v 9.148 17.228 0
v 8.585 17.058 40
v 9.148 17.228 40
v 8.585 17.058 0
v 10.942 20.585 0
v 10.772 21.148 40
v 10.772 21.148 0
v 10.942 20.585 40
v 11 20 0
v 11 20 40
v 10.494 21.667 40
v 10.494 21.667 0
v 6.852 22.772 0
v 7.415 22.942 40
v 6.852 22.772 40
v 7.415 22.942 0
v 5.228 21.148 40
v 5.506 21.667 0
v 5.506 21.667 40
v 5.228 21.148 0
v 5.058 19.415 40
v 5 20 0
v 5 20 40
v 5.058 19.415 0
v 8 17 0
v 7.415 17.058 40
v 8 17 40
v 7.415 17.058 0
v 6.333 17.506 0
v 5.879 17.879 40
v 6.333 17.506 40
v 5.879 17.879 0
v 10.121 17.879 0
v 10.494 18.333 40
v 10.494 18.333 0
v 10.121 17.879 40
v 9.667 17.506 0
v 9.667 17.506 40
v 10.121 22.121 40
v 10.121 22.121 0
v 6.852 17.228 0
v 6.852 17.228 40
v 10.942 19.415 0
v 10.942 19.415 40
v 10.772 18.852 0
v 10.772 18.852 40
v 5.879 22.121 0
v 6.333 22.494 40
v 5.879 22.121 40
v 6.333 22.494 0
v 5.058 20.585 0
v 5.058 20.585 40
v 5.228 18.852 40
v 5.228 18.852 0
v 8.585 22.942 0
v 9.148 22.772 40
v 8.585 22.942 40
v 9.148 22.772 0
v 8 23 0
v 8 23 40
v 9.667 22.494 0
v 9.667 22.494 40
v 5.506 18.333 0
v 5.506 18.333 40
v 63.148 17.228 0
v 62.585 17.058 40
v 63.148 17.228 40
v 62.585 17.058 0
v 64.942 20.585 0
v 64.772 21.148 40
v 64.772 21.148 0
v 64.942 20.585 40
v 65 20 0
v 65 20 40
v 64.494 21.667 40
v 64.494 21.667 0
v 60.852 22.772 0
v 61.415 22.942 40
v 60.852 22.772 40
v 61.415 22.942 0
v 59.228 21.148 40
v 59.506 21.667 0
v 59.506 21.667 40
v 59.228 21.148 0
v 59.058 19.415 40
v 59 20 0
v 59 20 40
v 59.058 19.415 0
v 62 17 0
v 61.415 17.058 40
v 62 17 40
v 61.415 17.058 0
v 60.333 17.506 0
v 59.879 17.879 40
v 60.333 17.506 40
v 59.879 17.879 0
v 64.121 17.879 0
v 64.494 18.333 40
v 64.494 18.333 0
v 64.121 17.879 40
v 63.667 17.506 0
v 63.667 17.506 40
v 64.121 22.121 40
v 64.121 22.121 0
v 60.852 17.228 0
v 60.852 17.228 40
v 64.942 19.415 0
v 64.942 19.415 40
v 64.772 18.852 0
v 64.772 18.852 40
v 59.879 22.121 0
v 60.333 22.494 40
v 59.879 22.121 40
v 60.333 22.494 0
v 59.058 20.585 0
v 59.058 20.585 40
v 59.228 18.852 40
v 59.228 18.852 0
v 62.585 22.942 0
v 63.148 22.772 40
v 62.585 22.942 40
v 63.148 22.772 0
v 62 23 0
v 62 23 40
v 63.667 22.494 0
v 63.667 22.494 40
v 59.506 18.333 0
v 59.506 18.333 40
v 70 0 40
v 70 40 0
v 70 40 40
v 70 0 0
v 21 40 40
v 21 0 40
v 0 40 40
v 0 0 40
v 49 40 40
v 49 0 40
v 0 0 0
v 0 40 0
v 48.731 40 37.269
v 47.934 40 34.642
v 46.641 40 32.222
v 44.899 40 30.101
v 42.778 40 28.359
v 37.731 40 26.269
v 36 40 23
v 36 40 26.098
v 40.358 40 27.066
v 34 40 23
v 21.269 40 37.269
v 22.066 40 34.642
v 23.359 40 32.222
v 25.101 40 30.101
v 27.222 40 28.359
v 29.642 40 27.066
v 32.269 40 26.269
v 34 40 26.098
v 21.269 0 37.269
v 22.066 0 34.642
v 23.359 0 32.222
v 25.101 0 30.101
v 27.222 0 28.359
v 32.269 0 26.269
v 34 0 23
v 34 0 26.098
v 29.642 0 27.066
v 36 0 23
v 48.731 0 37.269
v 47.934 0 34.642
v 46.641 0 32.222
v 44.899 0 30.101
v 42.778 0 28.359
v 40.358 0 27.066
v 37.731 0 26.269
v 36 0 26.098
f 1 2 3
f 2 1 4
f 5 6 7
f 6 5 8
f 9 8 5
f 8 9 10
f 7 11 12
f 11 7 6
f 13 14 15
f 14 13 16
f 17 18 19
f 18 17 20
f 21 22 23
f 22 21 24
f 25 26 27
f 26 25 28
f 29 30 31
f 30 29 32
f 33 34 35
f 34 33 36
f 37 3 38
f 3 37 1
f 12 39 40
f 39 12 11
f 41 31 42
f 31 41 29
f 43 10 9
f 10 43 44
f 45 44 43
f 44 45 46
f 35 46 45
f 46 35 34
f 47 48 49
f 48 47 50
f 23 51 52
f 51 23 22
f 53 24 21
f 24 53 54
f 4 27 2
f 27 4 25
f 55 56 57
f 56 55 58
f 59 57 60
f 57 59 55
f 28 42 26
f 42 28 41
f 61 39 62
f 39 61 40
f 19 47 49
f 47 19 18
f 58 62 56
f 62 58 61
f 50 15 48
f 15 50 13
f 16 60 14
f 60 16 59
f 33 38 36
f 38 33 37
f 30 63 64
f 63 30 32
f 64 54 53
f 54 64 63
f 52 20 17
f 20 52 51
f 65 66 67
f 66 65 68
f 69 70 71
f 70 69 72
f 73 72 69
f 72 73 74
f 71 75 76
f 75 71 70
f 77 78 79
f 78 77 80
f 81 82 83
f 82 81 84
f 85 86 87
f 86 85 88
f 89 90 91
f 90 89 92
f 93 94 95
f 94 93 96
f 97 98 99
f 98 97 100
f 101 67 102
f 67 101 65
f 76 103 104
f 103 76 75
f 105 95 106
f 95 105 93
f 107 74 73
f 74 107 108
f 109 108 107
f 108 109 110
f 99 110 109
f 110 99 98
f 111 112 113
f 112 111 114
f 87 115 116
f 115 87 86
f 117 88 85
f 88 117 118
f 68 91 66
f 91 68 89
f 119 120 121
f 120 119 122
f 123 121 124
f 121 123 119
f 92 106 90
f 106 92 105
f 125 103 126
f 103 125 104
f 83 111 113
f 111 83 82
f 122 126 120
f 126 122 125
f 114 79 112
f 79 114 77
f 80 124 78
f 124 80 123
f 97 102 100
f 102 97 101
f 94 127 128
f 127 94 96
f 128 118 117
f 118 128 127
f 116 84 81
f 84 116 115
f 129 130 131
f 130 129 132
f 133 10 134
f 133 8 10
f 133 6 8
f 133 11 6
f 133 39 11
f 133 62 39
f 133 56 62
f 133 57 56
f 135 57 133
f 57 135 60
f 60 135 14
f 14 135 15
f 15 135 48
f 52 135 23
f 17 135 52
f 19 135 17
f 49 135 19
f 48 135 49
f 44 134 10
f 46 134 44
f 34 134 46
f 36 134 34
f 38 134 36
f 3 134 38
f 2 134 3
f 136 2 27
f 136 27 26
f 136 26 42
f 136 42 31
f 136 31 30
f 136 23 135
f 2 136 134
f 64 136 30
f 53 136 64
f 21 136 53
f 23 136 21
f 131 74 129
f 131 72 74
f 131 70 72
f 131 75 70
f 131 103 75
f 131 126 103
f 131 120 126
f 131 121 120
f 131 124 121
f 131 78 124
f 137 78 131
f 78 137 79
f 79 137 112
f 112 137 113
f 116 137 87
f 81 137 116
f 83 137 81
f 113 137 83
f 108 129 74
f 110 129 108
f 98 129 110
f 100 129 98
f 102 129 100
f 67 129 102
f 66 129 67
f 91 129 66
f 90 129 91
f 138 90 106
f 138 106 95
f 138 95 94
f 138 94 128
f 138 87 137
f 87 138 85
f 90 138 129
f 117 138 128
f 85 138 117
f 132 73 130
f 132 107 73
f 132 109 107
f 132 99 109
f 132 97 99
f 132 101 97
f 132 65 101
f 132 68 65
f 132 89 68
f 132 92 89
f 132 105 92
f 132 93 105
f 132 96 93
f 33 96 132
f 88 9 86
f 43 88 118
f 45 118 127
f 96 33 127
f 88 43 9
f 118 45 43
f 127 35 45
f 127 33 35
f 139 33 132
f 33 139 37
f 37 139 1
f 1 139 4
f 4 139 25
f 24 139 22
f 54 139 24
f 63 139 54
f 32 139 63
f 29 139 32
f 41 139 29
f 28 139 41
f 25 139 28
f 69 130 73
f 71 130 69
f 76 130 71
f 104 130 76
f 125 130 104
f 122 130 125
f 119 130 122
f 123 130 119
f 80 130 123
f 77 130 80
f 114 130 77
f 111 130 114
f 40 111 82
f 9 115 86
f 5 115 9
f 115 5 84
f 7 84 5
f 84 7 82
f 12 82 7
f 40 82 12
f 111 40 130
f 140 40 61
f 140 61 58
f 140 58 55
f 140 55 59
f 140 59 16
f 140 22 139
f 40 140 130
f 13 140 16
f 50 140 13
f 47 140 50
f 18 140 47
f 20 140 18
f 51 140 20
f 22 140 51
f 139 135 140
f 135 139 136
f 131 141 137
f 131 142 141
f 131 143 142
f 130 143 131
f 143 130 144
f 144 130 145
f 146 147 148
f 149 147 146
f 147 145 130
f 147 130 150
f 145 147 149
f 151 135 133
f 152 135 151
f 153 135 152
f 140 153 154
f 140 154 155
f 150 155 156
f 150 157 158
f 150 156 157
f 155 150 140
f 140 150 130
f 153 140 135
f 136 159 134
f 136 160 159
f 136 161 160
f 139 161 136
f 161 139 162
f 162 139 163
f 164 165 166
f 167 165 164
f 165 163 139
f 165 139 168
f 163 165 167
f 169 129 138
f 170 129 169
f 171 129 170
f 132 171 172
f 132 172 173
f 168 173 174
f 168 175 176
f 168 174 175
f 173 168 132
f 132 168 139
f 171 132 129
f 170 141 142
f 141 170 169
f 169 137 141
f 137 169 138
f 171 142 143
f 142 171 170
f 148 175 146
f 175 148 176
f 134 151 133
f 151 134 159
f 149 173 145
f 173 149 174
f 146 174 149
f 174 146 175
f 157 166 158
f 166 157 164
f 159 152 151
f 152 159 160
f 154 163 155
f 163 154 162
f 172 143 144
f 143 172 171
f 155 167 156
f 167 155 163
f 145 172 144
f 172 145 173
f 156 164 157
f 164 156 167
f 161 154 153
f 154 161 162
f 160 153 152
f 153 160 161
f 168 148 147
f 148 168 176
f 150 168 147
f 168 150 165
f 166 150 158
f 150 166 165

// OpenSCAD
$fn = 32;

// ----------------------------------------------------------------------
// Saddle clamp: split shaft clamp
// ----------------------------------------------------------------------

// --- parameters (mm) ---
blk_l = 70;               // block length, X
blk_w = 40;               // block width, Y
blk_h = 40;               // block height
clamp_r = 14;             // shaft groove radius
hole_r = 3;               // bolt hole radius
hole_m = 8;               // bolt hole margin from the ends
saw_w = 2;                // saw kerf width

saw_depth = clamp_r + 3;  // saw kerf depth

difference() {
  cube([blk_l, blk_w, blk_h]);
  translate([blk_l / 2, -1, blk_h])
    rotate([-90, 0, 0])
      cylinder(h = blk_w + 2, r = clamp_r);
  for (sx = [0, 1])
    translate([sx ? blk_l - hole_m : hole_m, blk_w / 2, -1])
      cylinder(r = hole_r, h = blk_h + 2);
  translate([blk_l / 2 - saw_w / 2, -1, blk_h - saw_depth])
    cube([saw_w, blk_w + 2, saw_depth + 1]);
}
